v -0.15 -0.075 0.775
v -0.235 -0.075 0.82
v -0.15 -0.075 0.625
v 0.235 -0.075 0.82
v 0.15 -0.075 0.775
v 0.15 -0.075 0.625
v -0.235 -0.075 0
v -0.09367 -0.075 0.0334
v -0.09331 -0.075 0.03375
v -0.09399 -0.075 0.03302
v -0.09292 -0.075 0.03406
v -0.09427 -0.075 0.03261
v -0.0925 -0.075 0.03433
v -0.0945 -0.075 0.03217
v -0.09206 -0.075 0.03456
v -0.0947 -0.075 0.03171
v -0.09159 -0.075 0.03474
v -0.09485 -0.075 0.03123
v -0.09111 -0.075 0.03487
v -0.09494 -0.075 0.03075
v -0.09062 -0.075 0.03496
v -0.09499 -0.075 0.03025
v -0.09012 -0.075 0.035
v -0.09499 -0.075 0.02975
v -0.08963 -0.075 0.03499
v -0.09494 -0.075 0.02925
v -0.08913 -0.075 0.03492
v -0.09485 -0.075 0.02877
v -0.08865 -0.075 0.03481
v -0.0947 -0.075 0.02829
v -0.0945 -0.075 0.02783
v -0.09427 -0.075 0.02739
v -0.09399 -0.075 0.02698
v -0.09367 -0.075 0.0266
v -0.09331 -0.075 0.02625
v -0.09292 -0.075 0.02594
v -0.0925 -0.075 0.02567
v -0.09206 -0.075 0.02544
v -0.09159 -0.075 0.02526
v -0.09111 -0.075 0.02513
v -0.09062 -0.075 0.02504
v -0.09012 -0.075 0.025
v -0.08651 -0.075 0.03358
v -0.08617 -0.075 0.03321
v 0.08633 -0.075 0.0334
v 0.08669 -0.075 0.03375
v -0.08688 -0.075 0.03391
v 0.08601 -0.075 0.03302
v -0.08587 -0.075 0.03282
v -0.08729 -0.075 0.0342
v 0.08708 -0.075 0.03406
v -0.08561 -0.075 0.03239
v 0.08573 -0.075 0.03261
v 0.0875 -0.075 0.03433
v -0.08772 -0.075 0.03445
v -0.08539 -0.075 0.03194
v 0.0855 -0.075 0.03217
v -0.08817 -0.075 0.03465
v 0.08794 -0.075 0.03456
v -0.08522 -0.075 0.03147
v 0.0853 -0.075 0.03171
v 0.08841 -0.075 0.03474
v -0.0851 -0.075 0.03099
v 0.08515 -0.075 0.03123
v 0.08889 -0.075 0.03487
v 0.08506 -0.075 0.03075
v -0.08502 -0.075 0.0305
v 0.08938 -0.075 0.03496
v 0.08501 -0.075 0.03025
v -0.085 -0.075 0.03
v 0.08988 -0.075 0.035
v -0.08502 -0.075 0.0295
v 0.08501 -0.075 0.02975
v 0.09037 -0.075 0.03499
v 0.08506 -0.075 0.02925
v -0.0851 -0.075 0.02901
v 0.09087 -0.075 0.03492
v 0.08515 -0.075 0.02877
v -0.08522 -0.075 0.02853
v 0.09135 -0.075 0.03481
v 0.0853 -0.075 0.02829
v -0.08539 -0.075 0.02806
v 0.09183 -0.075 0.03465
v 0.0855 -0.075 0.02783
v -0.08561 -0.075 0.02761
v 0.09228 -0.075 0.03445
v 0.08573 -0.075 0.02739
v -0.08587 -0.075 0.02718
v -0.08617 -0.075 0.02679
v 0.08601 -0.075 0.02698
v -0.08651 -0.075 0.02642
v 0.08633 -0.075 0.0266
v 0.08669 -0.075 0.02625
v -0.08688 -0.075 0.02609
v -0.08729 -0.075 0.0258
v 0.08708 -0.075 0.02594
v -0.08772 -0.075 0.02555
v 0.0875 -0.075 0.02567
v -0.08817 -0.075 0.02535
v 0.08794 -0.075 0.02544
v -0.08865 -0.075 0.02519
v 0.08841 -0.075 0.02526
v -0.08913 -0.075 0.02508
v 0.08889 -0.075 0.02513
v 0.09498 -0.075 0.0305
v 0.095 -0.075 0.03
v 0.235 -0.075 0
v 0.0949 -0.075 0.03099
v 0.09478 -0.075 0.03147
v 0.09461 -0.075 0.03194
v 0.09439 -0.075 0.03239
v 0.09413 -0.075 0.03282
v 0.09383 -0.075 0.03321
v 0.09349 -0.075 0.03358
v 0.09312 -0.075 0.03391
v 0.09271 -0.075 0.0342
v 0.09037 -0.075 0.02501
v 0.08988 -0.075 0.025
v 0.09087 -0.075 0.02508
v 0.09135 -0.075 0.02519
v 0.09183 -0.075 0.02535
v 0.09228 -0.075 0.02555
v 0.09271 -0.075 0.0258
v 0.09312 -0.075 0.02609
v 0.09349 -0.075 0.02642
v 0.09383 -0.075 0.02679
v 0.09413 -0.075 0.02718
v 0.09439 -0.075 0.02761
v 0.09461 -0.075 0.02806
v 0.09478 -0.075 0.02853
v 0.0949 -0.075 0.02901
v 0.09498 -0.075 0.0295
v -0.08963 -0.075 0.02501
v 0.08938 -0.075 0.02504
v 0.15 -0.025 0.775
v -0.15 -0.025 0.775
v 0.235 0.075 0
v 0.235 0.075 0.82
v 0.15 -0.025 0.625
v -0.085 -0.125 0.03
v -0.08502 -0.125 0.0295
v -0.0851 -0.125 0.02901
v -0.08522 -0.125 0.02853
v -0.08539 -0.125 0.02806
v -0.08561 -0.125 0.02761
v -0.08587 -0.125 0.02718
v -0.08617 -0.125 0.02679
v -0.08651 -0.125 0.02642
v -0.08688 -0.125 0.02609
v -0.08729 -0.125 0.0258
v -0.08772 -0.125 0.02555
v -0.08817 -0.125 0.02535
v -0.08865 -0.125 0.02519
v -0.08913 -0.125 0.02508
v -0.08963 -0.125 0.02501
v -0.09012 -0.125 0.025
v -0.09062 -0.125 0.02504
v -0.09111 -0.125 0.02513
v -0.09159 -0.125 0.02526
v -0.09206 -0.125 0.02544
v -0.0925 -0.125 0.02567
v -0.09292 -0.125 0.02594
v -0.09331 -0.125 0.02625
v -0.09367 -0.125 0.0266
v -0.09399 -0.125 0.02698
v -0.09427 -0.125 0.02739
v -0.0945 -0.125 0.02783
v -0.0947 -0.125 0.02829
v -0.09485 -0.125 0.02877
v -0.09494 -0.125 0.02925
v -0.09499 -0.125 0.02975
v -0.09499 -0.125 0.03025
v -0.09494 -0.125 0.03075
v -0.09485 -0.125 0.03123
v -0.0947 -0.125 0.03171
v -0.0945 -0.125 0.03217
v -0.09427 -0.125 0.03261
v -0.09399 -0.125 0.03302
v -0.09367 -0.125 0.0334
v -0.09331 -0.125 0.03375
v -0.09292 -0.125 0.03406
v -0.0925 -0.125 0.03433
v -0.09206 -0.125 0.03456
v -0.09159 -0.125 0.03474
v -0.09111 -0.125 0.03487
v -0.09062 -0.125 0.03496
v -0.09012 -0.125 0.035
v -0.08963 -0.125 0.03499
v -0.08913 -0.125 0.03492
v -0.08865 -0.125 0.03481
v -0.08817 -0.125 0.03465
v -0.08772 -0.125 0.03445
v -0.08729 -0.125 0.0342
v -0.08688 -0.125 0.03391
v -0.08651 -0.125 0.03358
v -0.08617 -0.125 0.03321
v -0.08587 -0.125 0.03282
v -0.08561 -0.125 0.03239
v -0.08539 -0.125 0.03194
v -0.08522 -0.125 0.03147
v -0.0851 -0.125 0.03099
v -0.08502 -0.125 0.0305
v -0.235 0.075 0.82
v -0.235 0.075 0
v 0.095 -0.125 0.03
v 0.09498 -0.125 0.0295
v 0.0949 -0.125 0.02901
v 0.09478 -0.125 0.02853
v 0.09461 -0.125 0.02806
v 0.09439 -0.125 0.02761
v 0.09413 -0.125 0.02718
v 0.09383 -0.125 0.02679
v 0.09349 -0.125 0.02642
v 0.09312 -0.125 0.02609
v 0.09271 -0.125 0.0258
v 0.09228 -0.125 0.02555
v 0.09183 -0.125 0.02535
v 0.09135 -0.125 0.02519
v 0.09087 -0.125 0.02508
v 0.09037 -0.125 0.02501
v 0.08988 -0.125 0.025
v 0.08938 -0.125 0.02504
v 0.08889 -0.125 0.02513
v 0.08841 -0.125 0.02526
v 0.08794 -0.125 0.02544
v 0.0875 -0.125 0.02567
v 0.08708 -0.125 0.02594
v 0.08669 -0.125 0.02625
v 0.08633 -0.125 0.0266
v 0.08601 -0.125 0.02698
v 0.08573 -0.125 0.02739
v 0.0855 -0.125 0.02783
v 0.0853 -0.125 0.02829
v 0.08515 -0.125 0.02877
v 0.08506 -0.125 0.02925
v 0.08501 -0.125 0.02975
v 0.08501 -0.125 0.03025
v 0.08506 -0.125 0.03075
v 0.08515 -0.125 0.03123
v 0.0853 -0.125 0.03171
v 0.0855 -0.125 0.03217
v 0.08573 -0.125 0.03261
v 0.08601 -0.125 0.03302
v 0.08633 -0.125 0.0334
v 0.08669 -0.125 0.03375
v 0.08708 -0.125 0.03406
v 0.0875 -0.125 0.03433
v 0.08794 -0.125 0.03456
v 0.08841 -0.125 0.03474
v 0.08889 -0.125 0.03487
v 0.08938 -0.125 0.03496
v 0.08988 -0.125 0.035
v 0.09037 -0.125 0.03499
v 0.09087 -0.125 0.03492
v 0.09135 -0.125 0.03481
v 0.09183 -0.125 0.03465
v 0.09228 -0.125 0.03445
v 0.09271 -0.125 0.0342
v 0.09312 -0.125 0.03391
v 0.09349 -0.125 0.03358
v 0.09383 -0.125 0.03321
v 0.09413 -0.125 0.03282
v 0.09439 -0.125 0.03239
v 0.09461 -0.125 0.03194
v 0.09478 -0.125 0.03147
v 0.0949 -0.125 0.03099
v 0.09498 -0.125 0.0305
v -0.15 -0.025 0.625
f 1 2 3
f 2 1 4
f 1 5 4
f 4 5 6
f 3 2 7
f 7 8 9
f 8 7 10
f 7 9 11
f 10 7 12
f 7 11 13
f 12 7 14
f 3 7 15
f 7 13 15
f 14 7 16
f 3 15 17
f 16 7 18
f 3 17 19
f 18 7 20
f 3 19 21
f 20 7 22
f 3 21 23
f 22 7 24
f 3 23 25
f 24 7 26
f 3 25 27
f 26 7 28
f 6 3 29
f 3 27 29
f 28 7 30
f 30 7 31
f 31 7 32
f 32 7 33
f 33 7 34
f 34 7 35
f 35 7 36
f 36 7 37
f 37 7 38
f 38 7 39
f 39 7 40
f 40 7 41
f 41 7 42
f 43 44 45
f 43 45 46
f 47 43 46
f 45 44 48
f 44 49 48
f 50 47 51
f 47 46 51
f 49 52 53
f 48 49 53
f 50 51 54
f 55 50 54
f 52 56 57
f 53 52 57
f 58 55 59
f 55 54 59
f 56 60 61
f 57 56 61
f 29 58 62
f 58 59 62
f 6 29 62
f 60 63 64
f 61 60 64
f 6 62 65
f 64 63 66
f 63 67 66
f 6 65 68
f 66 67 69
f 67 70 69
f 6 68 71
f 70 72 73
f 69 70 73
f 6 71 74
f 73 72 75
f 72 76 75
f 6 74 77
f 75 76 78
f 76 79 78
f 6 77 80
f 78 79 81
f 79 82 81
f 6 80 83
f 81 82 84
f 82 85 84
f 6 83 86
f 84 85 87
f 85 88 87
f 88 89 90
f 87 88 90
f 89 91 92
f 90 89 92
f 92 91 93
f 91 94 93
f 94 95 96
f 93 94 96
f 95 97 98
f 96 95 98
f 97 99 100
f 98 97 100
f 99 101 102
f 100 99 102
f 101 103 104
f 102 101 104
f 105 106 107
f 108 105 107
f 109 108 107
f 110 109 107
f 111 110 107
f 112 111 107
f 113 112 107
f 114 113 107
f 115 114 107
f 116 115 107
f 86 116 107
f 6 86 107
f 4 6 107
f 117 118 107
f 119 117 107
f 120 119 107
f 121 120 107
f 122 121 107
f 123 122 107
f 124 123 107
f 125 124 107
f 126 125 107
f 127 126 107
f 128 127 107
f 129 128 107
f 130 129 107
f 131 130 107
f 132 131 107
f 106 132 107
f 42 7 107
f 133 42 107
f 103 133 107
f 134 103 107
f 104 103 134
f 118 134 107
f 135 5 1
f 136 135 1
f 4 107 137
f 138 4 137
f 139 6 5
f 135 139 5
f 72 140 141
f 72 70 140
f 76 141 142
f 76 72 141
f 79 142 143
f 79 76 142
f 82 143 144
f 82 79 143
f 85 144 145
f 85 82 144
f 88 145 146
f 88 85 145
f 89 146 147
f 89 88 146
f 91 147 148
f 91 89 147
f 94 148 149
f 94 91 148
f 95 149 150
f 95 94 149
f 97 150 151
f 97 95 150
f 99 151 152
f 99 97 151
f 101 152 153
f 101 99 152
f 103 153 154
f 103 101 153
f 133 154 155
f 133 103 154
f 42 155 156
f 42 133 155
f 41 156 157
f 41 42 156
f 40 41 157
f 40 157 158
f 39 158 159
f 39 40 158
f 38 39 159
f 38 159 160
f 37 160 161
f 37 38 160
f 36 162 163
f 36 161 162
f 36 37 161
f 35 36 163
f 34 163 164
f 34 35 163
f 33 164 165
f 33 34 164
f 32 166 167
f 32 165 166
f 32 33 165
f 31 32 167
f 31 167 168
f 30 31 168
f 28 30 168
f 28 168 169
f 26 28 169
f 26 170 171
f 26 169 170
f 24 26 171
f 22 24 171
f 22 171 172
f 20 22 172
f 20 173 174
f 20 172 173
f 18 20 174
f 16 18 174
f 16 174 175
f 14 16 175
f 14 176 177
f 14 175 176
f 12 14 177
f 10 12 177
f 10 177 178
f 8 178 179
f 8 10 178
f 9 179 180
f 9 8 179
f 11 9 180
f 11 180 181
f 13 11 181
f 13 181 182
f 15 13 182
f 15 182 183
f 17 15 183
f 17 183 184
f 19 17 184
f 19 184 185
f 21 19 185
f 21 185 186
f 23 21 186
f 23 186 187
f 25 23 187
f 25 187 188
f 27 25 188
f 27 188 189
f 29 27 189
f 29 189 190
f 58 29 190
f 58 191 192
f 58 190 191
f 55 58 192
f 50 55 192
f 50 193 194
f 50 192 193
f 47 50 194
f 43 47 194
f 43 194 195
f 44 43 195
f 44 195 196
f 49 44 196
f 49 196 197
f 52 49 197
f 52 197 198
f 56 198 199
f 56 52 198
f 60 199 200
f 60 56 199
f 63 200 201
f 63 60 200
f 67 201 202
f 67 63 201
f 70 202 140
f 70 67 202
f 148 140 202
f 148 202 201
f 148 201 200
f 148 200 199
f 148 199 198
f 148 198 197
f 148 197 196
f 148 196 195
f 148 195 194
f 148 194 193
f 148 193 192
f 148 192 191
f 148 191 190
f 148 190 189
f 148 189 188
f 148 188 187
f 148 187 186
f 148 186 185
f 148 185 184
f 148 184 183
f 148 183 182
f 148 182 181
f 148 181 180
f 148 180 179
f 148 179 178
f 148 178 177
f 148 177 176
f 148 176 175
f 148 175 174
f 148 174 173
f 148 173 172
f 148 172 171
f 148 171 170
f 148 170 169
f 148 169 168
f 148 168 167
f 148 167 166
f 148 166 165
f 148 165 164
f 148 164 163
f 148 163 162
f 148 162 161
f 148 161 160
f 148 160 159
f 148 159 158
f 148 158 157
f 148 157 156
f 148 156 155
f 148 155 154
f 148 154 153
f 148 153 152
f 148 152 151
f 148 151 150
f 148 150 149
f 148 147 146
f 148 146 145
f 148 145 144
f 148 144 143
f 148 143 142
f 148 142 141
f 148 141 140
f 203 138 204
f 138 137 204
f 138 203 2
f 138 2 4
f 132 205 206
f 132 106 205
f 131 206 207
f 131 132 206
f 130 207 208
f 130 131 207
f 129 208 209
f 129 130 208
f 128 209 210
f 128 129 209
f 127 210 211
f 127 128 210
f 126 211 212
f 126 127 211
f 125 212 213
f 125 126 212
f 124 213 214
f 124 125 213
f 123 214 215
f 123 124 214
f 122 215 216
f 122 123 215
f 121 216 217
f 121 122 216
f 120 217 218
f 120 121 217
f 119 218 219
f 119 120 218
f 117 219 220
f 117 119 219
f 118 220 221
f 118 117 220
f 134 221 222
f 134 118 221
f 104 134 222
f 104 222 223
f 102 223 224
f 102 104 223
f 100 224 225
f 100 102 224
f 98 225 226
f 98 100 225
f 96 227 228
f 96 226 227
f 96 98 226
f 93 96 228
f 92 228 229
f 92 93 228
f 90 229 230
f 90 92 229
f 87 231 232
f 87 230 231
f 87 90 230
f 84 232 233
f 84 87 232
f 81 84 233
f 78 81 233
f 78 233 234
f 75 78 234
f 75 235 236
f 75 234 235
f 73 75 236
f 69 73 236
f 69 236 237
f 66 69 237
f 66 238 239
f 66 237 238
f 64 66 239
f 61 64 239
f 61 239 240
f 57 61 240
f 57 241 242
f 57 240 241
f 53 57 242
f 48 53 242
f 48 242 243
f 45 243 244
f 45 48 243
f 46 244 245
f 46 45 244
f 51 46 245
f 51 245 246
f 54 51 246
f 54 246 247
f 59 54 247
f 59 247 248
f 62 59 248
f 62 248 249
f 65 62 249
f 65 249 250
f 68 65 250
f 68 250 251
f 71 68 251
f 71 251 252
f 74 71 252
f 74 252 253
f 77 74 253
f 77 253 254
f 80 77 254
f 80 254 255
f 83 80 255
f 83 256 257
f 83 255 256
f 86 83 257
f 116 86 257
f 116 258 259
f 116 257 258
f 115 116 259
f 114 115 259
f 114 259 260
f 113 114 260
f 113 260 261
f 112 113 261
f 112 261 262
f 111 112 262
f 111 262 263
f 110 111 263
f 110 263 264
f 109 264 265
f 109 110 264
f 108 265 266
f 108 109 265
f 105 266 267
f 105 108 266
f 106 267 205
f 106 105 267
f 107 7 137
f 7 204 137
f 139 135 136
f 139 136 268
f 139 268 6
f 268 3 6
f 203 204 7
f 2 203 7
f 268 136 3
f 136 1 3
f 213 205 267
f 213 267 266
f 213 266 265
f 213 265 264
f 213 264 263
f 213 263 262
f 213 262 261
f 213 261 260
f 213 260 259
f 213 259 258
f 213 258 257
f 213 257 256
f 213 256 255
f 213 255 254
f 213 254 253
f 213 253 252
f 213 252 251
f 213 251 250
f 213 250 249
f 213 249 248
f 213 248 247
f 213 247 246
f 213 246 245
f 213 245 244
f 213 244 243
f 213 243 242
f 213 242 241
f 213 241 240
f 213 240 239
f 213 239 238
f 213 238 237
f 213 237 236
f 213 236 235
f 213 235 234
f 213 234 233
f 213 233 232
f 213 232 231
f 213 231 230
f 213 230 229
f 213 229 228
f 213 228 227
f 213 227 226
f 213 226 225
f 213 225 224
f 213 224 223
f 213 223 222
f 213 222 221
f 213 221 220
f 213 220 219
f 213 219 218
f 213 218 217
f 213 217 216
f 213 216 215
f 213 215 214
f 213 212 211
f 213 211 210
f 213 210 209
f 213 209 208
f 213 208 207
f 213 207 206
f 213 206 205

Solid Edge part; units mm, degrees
sketch "Sketch1" plane through (0, 0, 0) normal (0, 0, 1) x (1, 0, 0)
  line L0 (-0.235, -0.075) -> (0.235, -0.075)
  line L1 (0.235, -0.075) -> (0.235, 0.075)
  line L2 (0.235, 0.075) -> (-0.235, 0.075)
  line L3 (-0.235, 0.075) -> (-0.235, -0.075)
  dimension "D1" = 0.15
  dimension "D2" = 0.47
extrude "Protrusion1" add sketch "Sketch1" along normal blind 0.82
sketch "Sketch2" plane through (0, -0.075, 0.395) normal (0, -1, 0) x (1, 0, 0)
  line L0 (-0.15, 0.23) -> (0.15, 0.23)
  line L1 (0.15, 0.23) -> (0.15, 0.38)
  line L2 (0.15, 0.38) -> (-0.15, 0.38)
  line L3 (-0.15, 0.38) -> (-0.15, 0.23)
  dimension "D1" = 0.7
  dimension "D2" = 0.3
  dimension "D3" = 0.15
extrude "Ausschnitt_1" cut sketch "Sketch2" against normal blind 0.05
sketch "Sketch3" plane through (0, -0.075, 0.41) normal (0, -1, 0) x (1, 0, 0)
  circle A0 centre (0.09, -0.38) radius 0.005
  circle A1 centre (-0.09, -0.38) radius 0.005
  dimension "D1" = 0.03
  dimension "D2" = 0.18
  dimension "D3" = 0.01
extrude "Ausprägung_2" add sketch "Sketch3" along normal blind 0.05
